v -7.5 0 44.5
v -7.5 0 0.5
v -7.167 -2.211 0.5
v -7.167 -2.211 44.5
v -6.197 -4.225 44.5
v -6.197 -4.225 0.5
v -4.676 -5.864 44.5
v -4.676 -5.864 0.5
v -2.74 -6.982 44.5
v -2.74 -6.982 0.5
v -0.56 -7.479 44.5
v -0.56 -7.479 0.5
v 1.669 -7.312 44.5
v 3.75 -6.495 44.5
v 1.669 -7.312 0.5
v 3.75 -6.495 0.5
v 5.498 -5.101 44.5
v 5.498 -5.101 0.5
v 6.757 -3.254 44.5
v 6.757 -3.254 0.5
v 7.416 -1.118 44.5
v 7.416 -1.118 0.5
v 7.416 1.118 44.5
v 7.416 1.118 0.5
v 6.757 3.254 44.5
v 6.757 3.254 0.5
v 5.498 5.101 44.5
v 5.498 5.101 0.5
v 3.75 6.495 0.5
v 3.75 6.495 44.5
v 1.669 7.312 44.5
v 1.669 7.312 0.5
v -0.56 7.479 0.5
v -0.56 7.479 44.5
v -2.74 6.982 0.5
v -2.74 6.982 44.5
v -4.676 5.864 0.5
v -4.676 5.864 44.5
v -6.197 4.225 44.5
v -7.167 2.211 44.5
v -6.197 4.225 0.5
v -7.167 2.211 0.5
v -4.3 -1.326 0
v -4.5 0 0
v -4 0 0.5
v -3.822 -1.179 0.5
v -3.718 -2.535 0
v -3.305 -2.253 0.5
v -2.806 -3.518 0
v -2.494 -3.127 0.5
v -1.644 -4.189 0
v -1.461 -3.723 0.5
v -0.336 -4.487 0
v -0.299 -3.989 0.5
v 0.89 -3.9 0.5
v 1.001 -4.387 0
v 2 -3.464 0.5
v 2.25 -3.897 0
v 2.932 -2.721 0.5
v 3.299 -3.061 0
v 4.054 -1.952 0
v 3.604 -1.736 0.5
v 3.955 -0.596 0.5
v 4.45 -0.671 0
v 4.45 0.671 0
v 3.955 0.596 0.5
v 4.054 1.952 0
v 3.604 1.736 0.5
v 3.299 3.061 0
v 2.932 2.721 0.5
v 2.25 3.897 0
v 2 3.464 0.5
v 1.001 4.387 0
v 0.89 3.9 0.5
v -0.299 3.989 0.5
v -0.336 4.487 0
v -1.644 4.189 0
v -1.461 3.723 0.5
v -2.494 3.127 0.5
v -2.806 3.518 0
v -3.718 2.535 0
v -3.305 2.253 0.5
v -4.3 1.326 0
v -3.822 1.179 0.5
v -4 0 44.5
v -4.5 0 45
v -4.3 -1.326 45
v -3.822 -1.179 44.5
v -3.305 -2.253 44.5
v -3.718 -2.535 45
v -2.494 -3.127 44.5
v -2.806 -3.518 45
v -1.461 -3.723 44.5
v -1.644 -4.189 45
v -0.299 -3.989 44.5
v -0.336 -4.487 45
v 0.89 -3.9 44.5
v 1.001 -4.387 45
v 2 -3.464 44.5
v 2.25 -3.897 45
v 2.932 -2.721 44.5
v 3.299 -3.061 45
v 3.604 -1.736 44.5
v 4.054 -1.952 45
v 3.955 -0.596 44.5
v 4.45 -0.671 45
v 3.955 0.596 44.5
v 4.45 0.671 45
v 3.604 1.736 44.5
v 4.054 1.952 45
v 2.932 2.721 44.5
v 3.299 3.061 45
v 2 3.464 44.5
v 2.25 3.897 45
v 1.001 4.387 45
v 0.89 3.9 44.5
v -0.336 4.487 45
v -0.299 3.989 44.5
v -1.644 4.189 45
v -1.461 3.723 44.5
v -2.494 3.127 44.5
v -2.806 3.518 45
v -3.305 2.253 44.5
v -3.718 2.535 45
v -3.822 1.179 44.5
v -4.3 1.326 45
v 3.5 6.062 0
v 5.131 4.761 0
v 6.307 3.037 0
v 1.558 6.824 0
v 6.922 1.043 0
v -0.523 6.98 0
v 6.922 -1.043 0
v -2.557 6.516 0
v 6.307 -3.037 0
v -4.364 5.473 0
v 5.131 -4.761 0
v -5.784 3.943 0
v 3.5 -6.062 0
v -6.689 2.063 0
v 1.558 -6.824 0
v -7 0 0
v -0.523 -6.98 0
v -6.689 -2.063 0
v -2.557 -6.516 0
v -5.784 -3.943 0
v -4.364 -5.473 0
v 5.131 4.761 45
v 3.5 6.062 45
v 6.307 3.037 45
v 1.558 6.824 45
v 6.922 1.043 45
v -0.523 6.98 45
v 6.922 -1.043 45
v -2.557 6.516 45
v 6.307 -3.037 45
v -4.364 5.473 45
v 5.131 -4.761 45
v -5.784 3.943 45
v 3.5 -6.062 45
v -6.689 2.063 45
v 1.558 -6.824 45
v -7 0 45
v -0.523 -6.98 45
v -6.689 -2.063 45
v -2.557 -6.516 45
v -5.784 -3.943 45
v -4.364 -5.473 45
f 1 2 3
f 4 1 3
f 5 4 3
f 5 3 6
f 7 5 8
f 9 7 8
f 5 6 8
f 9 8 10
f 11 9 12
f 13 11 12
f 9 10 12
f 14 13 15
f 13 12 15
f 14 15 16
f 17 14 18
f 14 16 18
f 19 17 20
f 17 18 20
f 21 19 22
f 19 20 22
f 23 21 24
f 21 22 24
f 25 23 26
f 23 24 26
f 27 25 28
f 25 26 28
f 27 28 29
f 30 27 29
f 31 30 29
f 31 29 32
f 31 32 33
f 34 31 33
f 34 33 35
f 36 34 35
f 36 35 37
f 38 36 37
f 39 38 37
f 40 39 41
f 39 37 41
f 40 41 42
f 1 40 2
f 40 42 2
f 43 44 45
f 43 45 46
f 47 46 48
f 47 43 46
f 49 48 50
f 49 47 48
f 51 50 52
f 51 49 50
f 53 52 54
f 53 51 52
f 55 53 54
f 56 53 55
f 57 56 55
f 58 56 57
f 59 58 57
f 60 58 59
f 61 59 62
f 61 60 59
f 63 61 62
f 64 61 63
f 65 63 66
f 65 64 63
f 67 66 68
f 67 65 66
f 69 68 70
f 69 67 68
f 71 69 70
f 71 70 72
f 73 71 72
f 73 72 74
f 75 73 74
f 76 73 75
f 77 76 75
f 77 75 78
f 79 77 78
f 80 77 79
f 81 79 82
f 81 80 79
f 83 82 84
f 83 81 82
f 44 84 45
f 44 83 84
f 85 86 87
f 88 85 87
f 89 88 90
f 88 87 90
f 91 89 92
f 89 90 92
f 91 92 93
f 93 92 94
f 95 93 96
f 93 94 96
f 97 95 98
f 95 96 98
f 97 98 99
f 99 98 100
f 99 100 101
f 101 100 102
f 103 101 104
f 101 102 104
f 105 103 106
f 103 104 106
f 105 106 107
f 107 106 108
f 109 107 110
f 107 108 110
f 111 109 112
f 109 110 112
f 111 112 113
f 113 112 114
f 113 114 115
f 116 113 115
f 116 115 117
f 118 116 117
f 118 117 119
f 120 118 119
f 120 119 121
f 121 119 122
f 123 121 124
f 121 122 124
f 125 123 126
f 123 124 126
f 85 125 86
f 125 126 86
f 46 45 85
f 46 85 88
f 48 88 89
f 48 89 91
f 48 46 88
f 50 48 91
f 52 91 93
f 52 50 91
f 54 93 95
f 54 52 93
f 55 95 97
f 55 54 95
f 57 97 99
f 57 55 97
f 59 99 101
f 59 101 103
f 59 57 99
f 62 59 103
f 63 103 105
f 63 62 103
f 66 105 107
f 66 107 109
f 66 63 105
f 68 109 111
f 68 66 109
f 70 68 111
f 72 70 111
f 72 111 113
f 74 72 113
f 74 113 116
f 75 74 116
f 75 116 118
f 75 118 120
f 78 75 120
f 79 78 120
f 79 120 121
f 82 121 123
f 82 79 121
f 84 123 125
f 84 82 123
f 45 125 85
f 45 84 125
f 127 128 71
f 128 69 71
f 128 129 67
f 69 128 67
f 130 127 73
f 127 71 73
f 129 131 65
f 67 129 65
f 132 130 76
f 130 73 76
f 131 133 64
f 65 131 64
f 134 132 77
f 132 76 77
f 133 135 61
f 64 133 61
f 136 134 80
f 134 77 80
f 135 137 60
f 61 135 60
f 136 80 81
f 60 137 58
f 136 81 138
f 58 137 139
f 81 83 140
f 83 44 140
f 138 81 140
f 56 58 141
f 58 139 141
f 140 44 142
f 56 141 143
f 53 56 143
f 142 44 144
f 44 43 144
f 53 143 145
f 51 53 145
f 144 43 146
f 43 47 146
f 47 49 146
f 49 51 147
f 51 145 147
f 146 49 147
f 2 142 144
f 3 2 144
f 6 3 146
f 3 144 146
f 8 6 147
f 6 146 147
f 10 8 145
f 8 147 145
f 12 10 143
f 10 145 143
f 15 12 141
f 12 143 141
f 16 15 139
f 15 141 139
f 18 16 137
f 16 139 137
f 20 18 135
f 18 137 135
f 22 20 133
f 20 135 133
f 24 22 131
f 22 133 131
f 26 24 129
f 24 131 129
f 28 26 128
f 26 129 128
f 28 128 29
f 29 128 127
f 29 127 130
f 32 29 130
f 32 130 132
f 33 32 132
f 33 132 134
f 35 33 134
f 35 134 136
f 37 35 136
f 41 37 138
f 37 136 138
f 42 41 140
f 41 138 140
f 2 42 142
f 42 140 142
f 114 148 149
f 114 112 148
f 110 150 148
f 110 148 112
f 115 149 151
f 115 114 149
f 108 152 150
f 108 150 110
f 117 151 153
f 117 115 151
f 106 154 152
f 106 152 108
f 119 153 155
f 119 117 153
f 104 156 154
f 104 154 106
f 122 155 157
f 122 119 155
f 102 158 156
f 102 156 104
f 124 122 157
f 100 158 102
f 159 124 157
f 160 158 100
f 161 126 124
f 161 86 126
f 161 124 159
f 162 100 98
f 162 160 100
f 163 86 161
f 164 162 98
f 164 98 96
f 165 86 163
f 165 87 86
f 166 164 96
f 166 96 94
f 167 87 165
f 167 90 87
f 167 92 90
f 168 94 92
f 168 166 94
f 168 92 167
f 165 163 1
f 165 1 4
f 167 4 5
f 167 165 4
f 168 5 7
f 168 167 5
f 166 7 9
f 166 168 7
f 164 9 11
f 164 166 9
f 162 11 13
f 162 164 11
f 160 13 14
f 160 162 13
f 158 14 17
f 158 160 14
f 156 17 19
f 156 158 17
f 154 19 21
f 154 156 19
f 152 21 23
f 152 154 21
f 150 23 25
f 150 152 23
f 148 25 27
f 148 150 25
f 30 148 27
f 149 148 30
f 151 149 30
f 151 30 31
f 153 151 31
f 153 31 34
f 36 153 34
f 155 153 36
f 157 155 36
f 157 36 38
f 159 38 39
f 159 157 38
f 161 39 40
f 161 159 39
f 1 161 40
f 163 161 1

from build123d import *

# Parameters (mm, degrees)
SKETCH_1_R      = 7.5
SKETCH_1_R_2    = 4
EXTRUDE_1_DEPTH = 45
CHAMFER_1_SIZE  = 0.5


with BuildPart() as part:
    # Эскиз1 → Бобышка-Вытянуть1 (new body)
    with BuildSketch(Plane.XY):
        with Locations(Location((0, 0, 0), (0, 0, 180))):
            Circle(SKETCH_1_R)
        with Locations(Location((0, 0, 0), (0, 0, 180))):
            Circle(SKETCH_1_R_2, mode=Mode.SUBTRACT)
    extrude(amount=EXTRUDE_1_DEPTH)

    # Фаска1
    chamfer_1_edges = [part.edges().sort_by_distance(p)[0] for p in [
        (7.5, 0, 0),
        (7.5, 0, 45),
        (4, 0, 0),
        (4, 0, 45),
    ]]
    chamfer(chamfer_1_edges, length=CHAMFER_1_SIZE)


solid = part.part
